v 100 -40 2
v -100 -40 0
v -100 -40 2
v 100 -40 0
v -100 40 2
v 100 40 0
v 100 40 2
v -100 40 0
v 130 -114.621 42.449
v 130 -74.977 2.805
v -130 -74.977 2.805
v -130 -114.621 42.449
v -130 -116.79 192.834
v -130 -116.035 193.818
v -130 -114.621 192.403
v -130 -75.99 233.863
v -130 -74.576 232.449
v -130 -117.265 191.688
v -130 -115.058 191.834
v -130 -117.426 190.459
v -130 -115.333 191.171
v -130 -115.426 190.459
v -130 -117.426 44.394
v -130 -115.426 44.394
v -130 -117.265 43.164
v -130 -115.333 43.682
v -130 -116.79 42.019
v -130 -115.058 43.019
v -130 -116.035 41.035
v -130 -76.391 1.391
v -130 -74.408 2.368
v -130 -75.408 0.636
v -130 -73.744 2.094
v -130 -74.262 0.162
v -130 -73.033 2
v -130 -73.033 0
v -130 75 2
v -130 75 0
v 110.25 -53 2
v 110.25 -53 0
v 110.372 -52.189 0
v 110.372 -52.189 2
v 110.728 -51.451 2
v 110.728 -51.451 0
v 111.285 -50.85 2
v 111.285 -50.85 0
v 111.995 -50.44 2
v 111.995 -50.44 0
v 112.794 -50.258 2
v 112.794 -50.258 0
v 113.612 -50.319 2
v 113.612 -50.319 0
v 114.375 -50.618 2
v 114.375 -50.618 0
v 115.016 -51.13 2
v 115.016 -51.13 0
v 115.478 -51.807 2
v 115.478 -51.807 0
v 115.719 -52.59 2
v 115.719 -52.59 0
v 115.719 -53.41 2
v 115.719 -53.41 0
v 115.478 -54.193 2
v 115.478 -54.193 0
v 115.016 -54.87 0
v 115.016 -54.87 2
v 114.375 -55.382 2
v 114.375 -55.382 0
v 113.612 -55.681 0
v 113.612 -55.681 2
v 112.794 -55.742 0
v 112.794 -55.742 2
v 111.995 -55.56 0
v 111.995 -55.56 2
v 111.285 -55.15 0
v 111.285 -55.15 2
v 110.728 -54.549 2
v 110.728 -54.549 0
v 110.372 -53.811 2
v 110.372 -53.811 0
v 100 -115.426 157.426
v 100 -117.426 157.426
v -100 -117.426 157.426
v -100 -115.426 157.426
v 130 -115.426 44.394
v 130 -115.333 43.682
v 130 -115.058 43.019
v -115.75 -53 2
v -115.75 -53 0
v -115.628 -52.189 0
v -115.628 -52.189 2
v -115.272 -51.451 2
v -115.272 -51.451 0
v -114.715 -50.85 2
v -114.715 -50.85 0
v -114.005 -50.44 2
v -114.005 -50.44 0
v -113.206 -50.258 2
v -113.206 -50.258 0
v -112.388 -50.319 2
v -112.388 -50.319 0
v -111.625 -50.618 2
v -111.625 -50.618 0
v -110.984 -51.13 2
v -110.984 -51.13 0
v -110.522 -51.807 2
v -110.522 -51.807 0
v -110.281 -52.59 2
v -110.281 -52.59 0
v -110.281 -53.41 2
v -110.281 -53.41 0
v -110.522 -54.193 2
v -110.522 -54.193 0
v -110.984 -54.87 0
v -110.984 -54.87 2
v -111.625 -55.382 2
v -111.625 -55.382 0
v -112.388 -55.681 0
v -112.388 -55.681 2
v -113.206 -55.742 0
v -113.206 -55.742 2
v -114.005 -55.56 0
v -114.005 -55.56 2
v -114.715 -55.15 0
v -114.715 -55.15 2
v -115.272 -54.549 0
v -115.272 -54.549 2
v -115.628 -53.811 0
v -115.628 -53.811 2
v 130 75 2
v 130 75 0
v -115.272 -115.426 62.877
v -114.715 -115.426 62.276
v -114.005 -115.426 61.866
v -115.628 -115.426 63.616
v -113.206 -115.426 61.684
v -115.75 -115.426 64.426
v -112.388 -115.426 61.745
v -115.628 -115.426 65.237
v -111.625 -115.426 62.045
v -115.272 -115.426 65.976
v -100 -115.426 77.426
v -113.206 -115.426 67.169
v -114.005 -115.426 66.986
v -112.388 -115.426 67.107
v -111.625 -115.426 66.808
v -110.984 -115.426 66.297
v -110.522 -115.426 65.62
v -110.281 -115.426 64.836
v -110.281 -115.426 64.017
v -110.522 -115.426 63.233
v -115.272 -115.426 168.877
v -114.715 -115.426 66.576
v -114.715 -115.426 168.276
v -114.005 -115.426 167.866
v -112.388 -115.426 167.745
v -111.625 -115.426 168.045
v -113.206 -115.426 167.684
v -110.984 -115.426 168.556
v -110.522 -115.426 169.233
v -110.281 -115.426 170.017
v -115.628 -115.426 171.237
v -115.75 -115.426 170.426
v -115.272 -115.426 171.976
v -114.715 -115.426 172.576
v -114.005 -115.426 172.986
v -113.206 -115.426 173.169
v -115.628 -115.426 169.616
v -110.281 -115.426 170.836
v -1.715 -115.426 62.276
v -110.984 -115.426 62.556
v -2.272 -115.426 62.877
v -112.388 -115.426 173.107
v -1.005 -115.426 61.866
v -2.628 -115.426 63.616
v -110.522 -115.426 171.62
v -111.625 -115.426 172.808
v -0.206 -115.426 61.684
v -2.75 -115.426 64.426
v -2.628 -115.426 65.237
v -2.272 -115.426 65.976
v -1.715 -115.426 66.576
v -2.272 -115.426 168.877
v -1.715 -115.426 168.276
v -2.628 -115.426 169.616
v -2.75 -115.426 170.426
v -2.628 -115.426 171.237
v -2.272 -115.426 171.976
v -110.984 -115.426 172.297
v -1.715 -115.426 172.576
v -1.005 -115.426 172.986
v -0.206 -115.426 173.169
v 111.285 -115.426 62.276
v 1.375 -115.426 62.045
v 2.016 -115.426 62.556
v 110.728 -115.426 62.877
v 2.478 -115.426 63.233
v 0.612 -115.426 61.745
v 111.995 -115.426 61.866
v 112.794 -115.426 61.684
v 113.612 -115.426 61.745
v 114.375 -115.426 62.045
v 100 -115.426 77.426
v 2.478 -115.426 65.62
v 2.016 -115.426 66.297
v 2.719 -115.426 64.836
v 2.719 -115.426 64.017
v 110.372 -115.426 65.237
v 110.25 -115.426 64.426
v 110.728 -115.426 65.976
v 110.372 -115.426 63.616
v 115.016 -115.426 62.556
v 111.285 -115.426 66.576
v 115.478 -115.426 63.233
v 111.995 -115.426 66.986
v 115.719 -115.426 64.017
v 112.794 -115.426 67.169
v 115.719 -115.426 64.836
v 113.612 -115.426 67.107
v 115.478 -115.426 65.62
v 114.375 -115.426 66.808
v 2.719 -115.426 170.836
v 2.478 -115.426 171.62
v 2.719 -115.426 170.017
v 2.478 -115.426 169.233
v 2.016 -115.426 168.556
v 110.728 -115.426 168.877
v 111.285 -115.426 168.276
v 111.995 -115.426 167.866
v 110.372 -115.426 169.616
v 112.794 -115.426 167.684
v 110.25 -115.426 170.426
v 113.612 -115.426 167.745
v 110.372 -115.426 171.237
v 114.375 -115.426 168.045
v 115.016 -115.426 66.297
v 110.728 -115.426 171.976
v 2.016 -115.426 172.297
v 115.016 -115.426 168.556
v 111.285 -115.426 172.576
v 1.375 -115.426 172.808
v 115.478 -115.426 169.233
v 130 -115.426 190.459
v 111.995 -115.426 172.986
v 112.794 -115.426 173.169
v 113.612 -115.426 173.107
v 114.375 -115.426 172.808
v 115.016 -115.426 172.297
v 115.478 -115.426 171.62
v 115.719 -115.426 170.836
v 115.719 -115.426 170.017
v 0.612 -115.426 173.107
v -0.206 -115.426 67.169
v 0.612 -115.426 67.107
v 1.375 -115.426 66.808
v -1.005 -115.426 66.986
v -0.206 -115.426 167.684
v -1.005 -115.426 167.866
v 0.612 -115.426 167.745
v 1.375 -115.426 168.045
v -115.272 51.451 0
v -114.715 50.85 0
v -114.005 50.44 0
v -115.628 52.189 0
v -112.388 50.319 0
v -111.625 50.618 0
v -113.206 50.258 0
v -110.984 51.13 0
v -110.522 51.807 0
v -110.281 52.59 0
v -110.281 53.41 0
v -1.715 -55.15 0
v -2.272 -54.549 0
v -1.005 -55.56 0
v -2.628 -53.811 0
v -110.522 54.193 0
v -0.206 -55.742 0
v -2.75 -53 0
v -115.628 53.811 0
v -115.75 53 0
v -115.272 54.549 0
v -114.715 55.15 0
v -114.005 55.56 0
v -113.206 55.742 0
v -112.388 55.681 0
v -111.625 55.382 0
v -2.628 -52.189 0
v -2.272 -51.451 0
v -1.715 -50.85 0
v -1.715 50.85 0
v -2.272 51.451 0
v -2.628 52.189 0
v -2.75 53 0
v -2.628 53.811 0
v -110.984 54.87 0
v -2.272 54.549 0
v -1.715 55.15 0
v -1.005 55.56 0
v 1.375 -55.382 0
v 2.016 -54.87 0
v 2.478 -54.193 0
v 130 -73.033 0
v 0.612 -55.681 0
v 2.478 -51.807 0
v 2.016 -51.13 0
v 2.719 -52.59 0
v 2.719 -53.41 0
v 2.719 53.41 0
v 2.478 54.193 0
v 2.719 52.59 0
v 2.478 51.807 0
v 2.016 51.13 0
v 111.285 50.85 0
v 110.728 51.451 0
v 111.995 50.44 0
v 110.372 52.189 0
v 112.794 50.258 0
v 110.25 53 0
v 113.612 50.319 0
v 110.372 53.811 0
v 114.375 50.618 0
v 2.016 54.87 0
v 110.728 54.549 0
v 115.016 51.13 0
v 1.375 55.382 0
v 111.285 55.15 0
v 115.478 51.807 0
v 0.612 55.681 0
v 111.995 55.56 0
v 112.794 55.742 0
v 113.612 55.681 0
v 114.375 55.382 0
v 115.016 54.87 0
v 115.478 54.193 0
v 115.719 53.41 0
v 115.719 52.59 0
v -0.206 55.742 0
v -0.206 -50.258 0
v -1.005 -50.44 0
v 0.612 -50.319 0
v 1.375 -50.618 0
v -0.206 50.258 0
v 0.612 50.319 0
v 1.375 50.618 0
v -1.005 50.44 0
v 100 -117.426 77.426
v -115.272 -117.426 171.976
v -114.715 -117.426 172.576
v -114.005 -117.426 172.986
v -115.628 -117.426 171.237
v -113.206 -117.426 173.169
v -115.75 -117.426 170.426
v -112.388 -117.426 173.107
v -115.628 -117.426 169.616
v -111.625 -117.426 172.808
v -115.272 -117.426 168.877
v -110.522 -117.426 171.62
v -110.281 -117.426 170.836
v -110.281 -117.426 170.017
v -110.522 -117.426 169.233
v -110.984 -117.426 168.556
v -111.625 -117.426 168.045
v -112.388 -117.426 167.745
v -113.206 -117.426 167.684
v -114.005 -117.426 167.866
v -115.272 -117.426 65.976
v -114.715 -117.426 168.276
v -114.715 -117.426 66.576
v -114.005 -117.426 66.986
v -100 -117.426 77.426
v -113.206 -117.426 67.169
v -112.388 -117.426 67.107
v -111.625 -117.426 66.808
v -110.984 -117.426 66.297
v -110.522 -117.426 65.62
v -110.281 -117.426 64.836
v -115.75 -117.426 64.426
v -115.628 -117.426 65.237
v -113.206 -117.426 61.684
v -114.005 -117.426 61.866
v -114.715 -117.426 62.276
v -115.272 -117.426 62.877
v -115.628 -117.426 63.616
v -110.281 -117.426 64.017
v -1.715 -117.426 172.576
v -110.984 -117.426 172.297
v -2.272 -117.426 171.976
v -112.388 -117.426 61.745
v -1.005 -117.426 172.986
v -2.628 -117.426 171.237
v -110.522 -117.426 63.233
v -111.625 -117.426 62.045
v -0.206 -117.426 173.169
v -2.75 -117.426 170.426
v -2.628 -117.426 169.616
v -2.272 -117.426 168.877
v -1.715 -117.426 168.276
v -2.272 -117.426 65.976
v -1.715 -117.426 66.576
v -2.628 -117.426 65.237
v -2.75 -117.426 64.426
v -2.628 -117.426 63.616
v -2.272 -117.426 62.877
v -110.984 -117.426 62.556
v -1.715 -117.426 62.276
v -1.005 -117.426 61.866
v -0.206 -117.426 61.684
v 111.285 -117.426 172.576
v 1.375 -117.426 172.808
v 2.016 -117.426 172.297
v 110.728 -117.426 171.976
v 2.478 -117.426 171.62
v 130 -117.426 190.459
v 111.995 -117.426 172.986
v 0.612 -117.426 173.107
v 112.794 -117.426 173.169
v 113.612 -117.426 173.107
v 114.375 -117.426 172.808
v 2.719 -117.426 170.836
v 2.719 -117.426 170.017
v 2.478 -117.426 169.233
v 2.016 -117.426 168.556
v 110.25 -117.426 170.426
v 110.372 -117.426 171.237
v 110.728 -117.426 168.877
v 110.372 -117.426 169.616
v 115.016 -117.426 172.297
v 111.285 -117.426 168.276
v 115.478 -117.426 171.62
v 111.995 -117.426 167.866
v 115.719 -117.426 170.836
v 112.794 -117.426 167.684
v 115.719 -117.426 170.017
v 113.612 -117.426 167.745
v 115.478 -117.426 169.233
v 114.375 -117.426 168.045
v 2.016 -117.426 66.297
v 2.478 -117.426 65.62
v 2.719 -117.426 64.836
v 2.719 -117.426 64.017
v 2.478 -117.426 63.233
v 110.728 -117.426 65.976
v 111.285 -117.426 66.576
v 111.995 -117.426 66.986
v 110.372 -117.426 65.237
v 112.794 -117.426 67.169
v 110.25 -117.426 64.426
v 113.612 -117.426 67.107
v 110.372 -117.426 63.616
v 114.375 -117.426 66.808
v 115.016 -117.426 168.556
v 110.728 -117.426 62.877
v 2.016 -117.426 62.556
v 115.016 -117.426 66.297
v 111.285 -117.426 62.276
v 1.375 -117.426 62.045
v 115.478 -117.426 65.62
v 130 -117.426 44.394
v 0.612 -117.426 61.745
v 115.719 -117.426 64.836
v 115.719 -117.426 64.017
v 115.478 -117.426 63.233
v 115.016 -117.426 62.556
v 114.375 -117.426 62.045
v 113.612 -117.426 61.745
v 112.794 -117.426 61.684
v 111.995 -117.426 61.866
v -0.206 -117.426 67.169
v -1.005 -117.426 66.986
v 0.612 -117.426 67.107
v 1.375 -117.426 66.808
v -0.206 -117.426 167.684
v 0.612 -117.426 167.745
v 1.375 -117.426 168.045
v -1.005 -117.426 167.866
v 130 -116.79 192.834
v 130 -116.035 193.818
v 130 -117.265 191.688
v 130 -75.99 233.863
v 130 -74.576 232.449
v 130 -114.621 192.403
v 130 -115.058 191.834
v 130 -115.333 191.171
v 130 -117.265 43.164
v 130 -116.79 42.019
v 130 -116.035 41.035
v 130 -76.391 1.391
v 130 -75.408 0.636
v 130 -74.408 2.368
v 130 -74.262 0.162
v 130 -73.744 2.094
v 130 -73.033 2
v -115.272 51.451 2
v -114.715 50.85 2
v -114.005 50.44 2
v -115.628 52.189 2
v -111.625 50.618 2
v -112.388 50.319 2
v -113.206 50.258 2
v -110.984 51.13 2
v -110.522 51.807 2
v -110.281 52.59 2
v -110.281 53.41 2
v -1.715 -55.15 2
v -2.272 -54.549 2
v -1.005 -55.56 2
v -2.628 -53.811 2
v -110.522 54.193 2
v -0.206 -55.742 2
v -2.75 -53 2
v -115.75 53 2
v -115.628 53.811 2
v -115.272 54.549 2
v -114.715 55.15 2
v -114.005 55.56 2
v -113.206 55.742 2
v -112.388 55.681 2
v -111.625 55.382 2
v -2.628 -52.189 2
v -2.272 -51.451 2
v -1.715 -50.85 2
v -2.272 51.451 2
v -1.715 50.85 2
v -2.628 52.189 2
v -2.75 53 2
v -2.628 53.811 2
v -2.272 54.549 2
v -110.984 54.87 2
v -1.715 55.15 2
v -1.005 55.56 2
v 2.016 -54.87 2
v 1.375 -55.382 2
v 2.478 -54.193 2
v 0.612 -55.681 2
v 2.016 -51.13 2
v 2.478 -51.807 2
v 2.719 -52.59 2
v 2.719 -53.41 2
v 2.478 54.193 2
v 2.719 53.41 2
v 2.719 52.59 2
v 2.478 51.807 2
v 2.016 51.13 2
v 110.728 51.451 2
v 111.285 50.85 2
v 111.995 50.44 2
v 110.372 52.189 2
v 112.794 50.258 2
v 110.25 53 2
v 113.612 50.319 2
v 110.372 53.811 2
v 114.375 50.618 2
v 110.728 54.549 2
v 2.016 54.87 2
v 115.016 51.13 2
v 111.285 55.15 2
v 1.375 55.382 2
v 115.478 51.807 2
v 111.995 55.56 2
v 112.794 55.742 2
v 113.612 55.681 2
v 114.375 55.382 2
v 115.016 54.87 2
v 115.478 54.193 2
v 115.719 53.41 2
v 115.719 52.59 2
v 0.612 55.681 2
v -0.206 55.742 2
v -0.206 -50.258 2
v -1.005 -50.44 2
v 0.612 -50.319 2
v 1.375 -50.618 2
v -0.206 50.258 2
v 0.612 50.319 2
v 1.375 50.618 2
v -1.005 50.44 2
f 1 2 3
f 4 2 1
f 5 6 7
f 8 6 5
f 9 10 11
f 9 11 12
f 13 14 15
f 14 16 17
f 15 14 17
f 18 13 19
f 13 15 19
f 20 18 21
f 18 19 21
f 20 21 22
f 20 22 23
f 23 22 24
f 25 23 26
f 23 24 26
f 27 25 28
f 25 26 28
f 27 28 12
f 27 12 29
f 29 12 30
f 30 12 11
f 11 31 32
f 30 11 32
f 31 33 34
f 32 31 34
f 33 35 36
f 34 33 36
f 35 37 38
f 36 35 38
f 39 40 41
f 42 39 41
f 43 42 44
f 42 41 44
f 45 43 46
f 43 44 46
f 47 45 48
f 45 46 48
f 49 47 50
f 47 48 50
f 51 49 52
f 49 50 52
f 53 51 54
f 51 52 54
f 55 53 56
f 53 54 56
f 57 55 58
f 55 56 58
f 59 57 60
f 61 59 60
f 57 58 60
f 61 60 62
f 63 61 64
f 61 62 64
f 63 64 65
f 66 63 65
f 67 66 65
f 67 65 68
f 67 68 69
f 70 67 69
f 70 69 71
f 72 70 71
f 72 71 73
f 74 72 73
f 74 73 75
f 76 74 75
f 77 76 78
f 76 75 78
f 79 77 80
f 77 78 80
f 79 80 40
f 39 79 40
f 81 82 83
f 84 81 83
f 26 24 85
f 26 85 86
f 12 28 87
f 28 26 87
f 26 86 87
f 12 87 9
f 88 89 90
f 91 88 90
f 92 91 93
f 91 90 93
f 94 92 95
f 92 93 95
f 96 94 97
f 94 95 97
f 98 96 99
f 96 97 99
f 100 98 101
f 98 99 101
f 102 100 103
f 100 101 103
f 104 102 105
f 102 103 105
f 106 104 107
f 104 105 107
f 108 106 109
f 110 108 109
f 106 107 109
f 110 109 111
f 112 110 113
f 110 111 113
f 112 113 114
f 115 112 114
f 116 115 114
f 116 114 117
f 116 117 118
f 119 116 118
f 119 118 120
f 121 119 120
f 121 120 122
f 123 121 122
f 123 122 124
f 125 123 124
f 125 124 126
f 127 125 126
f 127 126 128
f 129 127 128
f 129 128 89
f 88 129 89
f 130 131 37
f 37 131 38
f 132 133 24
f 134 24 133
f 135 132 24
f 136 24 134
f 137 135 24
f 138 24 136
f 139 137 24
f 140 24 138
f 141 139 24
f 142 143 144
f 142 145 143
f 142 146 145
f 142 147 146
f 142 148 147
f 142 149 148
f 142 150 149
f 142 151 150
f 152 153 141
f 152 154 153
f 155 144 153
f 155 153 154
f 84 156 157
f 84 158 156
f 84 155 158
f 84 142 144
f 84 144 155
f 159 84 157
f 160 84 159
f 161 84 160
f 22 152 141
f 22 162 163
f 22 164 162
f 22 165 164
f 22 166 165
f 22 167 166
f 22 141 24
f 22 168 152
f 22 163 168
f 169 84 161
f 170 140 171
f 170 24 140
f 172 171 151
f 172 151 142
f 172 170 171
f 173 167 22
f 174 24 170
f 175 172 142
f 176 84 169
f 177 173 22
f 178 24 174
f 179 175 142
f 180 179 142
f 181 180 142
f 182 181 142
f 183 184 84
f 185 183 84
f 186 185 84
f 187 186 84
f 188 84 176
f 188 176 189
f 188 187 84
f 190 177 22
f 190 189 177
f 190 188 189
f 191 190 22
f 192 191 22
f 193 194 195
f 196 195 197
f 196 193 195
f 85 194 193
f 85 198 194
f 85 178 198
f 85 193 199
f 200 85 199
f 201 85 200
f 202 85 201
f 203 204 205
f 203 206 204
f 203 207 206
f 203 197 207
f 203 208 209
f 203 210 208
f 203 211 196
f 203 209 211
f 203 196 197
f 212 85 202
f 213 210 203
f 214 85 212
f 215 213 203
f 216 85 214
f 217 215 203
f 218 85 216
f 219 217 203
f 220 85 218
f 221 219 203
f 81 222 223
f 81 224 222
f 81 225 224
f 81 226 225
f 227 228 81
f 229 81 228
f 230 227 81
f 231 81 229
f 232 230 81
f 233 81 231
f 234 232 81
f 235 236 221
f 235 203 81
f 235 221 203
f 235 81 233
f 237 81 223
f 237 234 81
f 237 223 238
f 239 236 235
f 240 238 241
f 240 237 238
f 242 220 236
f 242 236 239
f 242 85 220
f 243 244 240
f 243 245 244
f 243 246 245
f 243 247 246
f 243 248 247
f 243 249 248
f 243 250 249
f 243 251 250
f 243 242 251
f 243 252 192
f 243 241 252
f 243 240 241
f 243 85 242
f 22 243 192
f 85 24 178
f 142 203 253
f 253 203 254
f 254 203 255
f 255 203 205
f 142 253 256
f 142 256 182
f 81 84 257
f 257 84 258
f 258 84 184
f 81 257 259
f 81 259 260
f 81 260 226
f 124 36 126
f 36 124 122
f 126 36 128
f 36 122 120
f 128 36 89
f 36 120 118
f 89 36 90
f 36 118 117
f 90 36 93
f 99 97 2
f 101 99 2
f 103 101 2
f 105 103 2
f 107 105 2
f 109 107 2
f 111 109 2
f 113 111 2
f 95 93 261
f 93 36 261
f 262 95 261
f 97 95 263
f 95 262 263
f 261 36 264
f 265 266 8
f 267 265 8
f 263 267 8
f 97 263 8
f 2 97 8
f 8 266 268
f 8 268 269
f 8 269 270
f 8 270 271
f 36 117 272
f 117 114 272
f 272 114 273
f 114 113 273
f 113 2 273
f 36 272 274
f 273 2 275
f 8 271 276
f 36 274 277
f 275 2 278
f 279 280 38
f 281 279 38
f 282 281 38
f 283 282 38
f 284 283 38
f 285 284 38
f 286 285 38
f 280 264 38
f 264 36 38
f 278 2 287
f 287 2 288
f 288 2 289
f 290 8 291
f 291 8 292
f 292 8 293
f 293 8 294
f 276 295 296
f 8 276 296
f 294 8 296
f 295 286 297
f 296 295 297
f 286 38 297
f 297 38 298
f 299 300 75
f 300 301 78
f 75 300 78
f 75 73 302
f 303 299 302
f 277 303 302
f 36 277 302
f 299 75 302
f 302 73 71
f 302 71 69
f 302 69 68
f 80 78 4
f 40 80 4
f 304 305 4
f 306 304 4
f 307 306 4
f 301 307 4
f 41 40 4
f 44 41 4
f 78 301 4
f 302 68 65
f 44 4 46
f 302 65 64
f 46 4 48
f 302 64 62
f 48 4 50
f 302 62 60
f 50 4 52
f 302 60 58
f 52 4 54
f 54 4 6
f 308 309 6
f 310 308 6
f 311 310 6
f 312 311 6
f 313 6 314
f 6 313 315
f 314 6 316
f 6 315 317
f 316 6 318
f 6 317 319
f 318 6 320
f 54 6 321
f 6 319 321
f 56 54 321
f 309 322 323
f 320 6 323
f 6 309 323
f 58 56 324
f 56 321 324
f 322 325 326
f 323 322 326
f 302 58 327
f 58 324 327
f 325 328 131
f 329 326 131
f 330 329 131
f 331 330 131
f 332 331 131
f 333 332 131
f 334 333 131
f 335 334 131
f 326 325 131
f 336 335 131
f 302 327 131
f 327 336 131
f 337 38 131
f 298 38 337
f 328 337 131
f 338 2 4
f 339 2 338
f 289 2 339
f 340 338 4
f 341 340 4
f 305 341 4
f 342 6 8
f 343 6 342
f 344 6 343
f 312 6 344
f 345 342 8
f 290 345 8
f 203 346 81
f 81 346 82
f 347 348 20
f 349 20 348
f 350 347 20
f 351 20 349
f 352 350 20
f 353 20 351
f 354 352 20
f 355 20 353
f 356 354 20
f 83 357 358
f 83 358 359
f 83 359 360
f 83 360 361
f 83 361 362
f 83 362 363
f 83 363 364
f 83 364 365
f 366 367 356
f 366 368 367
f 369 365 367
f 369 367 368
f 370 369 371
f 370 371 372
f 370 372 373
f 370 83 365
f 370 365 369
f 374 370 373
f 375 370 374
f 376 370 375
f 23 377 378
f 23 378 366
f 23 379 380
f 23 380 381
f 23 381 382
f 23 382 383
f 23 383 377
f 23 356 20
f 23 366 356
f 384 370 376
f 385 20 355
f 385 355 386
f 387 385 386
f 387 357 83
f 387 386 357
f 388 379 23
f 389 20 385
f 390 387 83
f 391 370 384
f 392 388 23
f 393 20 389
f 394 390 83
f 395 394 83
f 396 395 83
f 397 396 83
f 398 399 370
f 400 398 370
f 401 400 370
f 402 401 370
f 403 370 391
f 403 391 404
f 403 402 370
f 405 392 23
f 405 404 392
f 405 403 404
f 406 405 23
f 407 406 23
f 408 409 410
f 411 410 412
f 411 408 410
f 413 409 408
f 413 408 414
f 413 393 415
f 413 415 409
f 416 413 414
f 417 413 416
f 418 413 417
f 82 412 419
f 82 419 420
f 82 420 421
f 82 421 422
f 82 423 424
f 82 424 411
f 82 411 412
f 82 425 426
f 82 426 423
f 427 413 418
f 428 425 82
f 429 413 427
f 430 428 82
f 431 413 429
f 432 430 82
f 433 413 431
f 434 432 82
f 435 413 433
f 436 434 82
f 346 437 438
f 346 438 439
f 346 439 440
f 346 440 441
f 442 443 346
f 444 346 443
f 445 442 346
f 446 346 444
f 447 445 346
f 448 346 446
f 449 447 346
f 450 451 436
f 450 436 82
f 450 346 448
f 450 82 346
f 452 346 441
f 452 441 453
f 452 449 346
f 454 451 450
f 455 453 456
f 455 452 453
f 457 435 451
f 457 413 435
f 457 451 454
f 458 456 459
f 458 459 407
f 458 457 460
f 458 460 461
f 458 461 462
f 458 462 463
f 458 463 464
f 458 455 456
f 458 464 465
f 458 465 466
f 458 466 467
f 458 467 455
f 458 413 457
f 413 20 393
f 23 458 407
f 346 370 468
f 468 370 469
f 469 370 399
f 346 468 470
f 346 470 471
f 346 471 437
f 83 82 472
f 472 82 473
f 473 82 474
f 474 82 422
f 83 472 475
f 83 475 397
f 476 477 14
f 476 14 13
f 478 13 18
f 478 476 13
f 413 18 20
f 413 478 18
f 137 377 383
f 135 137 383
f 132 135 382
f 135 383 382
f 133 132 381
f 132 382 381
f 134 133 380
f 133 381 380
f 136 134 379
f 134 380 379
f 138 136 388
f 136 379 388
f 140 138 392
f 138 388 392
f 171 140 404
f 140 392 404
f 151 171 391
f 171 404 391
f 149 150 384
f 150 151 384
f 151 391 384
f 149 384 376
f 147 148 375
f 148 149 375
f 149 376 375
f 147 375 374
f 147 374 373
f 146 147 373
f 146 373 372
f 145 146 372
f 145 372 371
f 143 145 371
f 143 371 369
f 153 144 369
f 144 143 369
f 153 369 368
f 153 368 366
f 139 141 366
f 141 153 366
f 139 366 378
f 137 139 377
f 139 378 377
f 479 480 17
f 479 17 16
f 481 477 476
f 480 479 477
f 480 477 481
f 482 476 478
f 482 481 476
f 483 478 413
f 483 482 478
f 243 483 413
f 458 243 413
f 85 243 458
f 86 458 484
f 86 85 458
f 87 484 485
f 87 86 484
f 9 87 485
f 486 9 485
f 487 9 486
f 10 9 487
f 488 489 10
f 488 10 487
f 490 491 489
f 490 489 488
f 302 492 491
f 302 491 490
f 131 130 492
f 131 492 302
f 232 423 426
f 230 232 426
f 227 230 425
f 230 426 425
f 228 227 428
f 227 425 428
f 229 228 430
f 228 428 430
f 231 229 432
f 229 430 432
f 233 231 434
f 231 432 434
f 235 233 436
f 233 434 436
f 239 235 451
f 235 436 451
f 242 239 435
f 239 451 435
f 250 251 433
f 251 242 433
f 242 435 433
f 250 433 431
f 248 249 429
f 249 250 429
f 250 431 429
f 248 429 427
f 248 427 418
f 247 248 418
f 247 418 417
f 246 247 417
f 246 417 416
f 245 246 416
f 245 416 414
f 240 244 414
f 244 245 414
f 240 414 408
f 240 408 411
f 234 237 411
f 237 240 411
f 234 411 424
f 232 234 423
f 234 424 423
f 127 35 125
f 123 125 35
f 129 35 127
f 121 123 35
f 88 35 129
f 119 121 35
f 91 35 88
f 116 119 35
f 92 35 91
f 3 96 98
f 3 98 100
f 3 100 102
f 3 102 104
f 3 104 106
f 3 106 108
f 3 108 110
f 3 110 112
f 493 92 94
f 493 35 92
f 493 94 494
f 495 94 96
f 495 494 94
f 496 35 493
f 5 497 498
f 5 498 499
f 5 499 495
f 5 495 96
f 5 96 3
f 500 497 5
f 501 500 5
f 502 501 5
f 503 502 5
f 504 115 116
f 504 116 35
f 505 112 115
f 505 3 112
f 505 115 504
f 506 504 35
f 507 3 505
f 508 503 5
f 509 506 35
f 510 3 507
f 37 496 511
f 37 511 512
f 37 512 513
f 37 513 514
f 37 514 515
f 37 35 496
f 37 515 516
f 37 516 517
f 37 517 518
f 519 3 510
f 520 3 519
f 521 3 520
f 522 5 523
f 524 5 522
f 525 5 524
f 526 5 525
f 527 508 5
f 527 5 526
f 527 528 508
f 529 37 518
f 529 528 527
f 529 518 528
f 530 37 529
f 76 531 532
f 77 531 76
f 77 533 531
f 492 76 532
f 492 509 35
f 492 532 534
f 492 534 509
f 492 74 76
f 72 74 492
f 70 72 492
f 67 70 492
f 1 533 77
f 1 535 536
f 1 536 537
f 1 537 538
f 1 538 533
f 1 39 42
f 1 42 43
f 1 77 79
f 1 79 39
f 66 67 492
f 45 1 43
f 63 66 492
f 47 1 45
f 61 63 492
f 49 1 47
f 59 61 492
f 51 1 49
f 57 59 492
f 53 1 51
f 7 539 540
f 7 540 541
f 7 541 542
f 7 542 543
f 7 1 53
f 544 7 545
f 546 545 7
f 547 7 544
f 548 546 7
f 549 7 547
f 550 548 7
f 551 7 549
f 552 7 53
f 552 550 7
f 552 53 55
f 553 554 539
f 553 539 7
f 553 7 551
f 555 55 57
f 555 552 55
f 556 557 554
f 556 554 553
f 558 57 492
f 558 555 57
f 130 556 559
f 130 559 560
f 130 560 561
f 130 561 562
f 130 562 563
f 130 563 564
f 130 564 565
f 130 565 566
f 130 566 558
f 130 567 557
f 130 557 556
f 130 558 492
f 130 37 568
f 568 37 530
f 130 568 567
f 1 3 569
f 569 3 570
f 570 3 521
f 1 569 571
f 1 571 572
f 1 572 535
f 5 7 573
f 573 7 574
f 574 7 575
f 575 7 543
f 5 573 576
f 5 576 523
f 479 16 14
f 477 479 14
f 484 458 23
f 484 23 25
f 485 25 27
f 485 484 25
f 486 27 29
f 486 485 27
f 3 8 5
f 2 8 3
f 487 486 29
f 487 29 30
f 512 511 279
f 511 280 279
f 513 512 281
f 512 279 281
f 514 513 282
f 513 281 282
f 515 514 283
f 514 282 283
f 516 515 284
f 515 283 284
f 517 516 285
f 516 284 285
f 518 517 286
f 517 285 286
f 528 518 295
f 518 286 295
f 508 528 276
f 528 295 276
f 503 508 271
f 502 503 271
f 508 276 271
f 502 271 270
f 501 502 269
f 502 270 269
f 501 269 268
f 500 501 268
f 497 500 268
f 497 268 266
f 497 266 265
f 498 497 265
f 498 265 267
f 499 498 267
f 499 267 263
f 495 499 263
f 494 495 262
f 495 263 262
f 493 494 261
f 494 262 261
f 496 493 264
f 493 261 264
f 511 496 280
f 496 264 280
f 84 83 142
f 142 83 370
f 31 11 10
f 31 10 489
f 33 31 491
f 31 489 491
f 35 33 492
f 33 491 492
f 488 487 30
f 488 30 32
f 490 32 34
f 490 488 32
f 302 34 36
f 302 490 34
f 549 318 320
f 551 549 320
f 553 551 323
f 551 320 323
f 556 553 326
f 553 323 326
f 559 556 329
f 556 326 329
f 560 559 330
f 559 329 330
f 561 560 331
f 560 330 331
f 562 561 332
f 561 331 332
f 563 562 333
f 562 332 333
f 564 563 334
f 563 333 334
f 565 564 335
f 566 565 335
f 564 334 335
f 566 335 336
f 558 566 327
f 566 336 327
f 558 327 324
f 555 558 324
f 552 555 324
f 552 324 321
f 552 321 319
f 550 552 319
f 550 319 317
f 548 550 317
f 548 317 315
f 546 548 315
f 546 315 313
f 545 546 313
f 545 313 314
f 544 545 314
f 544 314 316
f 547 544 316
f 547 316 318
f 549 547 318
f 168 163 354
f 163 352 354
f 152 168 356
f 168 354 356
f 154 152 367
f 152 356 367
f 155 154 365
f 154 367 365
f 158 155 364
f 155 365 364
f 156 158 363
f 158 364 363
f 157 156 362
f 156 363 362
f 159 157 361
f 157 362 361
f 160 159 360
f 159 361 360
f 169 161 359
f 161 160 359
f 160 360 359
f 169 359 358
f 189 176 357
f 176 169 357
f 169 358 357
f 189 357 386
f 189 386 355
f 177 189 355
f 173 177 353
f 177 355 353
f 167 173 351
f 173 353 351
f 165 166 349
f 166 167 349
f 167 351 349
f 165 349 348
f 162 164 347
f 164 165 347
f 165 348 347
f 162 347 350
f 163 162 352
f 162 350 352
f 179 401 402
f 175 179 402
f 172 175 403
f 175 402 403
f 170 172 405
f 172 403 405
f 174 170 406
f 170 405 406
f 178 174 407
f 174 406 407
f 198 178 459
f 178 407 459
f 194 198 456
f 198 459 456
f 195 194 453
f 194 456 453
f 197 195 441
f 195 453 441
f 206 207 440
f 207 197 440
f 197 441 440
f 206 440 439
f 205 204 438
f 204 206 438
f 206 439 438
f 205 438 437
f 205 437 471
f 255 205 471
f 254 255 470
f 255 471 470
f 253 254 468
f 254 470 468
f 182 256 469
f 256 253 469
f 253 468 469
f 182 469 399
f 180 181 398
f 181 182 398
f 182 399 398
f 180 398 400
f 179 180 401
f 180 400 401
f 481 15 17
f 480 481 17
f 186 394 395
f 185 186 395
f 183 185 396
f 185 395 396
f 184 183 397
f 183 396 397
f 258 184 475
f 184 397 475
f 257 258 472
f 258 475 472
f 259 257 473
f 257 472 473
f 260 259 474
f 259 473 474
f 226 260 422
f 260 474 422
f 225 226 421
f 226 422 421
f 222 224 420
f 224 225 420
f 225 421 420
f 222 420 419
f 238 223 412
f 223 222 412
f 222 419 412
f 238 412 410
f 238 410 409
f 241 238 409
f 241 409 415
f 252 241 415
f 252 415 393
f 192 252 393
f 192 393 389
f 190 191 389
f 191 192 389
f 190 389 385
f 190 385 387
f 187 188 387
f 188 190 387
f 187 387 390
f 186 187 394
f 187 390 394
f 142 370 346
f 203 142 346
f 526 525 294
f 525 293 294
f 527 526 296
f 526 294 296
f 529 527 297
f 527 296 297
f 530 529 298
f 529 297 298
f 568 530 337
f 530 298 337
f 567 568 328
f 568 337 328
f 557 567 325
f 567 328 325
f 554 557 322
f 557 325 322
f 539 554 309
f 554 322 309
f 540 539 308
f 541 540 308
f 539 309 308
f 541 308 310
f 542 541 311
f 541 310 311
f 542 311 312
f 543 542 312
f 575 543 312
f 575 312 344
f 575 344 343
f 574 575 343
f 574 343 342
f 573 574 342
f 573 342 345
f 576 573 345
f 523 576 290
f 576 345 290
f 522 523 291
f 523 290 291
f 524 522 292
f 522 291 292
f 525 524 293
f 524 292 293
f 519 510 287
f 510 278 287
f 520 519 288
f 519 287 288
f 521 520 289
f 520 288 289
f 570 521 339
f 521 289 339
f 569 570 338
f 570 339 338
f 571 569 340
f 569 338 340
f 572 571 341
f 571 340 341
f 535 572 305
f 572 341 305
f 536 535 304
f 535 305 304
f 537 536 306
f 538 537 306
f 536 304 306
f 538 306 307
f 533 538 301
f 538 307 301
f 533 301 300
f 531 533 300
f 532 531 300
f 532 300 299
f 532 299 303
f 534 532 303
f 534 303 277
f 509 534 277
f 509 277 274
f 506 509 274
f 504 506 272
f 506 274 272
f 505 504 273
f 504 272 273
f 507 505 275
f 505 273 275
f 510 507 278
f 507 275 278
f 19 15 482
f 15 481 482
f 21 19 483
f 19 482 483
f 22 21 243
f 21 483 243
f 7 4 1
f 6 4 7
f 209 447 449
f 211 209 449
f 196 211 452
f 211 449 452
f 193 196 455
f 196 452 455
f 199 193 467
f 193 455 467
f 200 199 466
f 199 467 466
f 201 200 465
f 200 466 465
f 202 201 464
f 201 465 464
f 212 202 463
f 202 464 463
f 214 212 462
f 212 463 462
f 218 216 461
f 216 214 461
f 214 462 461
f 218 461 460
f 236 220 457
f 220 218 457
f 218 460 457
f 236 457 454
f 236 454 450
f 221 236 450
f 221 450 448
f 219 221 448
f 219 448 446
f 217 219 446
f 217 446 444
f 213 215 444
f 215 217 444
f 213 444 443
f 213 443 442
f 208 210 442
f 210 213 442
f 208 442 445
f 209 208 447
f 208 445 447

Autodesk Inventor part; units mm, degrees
ref_plane "YZ Plane" through (0, 0, 0) normal (1, 0, 0) x (0, 1, 0)
ref_plane "XZ Plane" through (0, 0, 0) normal (0, 1, 0) x (-1, 0, 0)
sketch "Sketch1" plane through (0, 0, 0) normal (0, 0, 1) x (1, 0, 0)
  line L0 (130, 75) -> (-130, 75)
  line L1 (-130, 75) -> (-130, -75)
  line L2 (-130, -75) -> (130, -75)
  line L3 (130, -75) -> (130, 75)
  line L4 (130, 75) -> (-130, -75) construction
  line L5 (-130, 75) -> (130, -75) construction
  line L6 (100, 40) -> (-100, 40)
  line L7 (-100, 40) -> (-100, -40)
  line L8 (-100, -40) -> (100, -40)
  line L9 (100, -40) -> (100, 40)
  line L10 (100, 40) -> (-100, -40) construction
  line L11 (-100, 40) -> (100, -40) construction
  point P0 (0, 0)
  point P1 (0, 0)
  point P2 (0, 0)
  point P3 (100, 0)
  point P4 (130, 0)
  dimension "d34" = 200
  dimension "d35" = 80
  dimension "d51" = 30
  dimension "d53" = 30
  dimension "d54" = 35
  dimension "d56" = 150
extrude "Plate1" add sketch "Sketch1" along normal blind 2
sketch "Sketch6" plane through (130, -73.5858, 1.4142) normal (0, -0.7071068, -0.7071068) x (1, 0, 0)
  line L0 (-260, 0) -> (0, 0)
  line L1 (0, 0) -> (0, 60)
  line L2 (0, 60) -> (-260, 60)
  line L3 (-260, 60) -> (-260, 0)
edge flange "Flange2" height 60 angle 45 thickness 2 bend radius 2.75 thickness toward (0, -0.7071068, -0.7071068) relief round relief width 2 relief depth 1 edges at (0, -75, 2) wall of the first edge with corners at (-130, -73.5858, 1.4142) (130, -73.5858, 1.4142) (130, -116.0122, 43.8406) (-130, -116.0122, 43.8406)
bend "Bend2"
corner "Corner2"
sketch "Sketch8" plane through (130, -115.4264, 42.4264) normal (0, -1, 0) x (1, 0, 0)
  line L0 (-260, 0) -> (0, 0)
  line L1 (0, 0) -> (0, 150)
  line L2 (0, 150) -> (-260, 150)
  line L3 (-260, 150) -> (-260, 0)
edge flange "Flange3" height 150 angle 45 thickness 2 bend radius 2.75 thickness toward (0, -1, 0) relief round relief width 2 relief depth 1 edges at (0, -116.0122, 43.8406) wall of the first edge with corners at (-130, -115.4264, 42.4264) (130, -115.4264, 42.4264) (130, -115.4264, 192.4264) (-130, -115.4264, 192.4264)
bend "Bend3"
corner "Corner3"
sketch "Sketch9" plane through (130, -116.0122, 191.0122) normal (0, -0.7071068, 0.7071068) x (1, 0, 0)
  line L0 (-260, 0) -> (0, 0)
  line L1 (0, 0) -> (0, 58.6)
  line L2 (0, 58.6) -> (-260, 58.6)
  line L3 (-260, 58.6) -> (-260, 0)
edge flange "Flange4" height 58.6 angle 45 thickness 2 bend radius 2.75 thickness toward (0, -0.7071068, 0.7071068) relief round relief width 2 relief depth 1 edges at (0, -115.4264, 192.4264) wall of the first edge with corners at (-130, -116.0122, 191.0122) (130, -116.0122, 191.0122) (130, -74.5757, 232.4487) (-130, -74.5757, 232.4487)
bend "Bend4"
corner "Corner4"
sketch "Sketch10" plane through (-130, -117.4264, 44.3939) normal (0, -1, 0) x (1, 0, 0)
  line L0 (260, 146.065) -> (0, 146.065) projected
  line L1 (0, 0) -> (0, 146.065) projected
  line L2 (0, 0) -> (260, 0) projected
  line L3 (260, 146.065) -> (260, 0) projected
  line L4 (30, 33.0325) -> (230, 33.0325)
  line L5 (230, 33.0325) -> (230, 113.0325)
  line L6 (230, 113.0325) -> (30, 113.0325)
  line L7 (30, 113.0325) -> (30, 33.0325)
  point P0 (130, -44.3939)
  point P1 (30, 73.0325)
  point P2 (0, 73.0325)
  dimension "d77" = 80
  dimension "d78" = 200
  dimension "d79" = 30
extrude "Cut3" cut sketch "Sketch10" against normal blind 2 contours L7 L6 L5 L4
sketch "Sketch11" plane through (0, 0, 0) normal (0, 0, -1) x (-1, 0, 0)
  line L0 (100, -40) -> (-100, -40) construction
  line L1 (-100, -40) -> (-100, 40) construction
  line L2 (-100, 40) -> (100, 40) construction
  line L3 (100, 40) -> (100, -40) construction
  circle A0 centre (0, -53) radius 2.75
  circle A1 centre (0, 53) radius 2.75
  line L4 (-100, 0) -> (100, 0) construction
  point P0 (0, 0)
  dimension "d82" = 106
  dimension "d83" = 5.5
extrude "Cut4" cut sketch "Sketch11" against normal blind 2
pattern_linear "Rectangular Pattern1" count 3 spacing 113 along (1, 0, 0) of "Cut4" first direction both ways yes
ref_plane "Work Plane1" through (0, -117.4264, 0) normal (0, 0.7071068, -0.7071068) x (1, 0, 0)
mirror "Mirror1" about plane through (0, -117.4264, 0) normal (0, 0.7071068, -0.7071068) of "Cut4", "Rectangular Pattern1"
equation "\"d34\" = MAIN_6_central_window_hight"
equation "\"d35\" = MAIN_7_central_window_width"
equation "\"d56\" = Wall_1_width"
equation "\"d77\" = MAIN_7_central_window_width"
equation "\"d78\" = MAIN_6_central_window_hight"
equation "\"d79\" = d53"
equation "\"d80\" = Thickness"
equation "\"d84\" = Thickness"
equation "\"d2\" = Thickness"
equation "\"d36\" = BendReliefWidth"
equation "\"d37\" = BendReliefDepth"
equation "\"d38\" = MinimumRemnant"
equation "\"d39\" = TransitionRadius"
equation "\"d40\" = Wall_2_width"
equation "\"d42\" = BendRadius"
equation "\"d43\" = CornerReliefSize"
equation "\"d44\" = GapSize"
equation "\"d45\" = JacobiRadiusSize"
equation "\"d57\" = BendReliefWidth"
equation "\"d58\" = BendReliefDepth"
equation "\"d59\" = MinimumRemnant"
equation "\"d60\" = TransitionRadius"
equation "\"d61\" = d56"
equation "\"d63\" = BendRadius"
equation "\"d64\" = CornerReliefSize"
equation "\"d65\" = GapSize"
equation "\"d66\" = JacobiRadiusSize"
equation "\"d67\" = BendReliefWidth"
equation "\"d68\" = BendReliefDepth"
equation "\"d69\" = MinimumRemnant"
equation "\"d70\" = TransitionRadius"
equation "\"d71\" = Wall_2_width - 0.7 * Thickness"
equation "\"d73\" = BendRadius"
equation "\"d74\" = CornerReliefSize"
equation "\"d75\" = GapSize"
equation "\"d76\" = JacobiRadiusSize"
equation "\"BendReliefWidth\" = Thickness"
equation "\"BendReliefDepth\" = 0.5 * Thickness"
equation "\"CornerReliefSize\" = 4 * Thickness"
equation "\"MinimumRemnant\" = 2 * Thickness"
equation "\"TransitionRadius\" = BendRadius"
equation "\"JacobiRadiusSize\" = BendRadius"
equation "\"GapSize\" = Thickness"
equation "\"MAIN_6_central_window_hight\" = 200"
equation "\"MAIN_7_central_window_width\" = 80"
equation "\"Wall_1_width\" = 150"
equation "\"Thickness\" = 2"
equation "\"Wall_2_width\" = 60"
equation "\"BendRadius\" = 2.75"
properties part number "TKS 3554 BOTTOM DS box wall 1" material "Stainless Steel"
